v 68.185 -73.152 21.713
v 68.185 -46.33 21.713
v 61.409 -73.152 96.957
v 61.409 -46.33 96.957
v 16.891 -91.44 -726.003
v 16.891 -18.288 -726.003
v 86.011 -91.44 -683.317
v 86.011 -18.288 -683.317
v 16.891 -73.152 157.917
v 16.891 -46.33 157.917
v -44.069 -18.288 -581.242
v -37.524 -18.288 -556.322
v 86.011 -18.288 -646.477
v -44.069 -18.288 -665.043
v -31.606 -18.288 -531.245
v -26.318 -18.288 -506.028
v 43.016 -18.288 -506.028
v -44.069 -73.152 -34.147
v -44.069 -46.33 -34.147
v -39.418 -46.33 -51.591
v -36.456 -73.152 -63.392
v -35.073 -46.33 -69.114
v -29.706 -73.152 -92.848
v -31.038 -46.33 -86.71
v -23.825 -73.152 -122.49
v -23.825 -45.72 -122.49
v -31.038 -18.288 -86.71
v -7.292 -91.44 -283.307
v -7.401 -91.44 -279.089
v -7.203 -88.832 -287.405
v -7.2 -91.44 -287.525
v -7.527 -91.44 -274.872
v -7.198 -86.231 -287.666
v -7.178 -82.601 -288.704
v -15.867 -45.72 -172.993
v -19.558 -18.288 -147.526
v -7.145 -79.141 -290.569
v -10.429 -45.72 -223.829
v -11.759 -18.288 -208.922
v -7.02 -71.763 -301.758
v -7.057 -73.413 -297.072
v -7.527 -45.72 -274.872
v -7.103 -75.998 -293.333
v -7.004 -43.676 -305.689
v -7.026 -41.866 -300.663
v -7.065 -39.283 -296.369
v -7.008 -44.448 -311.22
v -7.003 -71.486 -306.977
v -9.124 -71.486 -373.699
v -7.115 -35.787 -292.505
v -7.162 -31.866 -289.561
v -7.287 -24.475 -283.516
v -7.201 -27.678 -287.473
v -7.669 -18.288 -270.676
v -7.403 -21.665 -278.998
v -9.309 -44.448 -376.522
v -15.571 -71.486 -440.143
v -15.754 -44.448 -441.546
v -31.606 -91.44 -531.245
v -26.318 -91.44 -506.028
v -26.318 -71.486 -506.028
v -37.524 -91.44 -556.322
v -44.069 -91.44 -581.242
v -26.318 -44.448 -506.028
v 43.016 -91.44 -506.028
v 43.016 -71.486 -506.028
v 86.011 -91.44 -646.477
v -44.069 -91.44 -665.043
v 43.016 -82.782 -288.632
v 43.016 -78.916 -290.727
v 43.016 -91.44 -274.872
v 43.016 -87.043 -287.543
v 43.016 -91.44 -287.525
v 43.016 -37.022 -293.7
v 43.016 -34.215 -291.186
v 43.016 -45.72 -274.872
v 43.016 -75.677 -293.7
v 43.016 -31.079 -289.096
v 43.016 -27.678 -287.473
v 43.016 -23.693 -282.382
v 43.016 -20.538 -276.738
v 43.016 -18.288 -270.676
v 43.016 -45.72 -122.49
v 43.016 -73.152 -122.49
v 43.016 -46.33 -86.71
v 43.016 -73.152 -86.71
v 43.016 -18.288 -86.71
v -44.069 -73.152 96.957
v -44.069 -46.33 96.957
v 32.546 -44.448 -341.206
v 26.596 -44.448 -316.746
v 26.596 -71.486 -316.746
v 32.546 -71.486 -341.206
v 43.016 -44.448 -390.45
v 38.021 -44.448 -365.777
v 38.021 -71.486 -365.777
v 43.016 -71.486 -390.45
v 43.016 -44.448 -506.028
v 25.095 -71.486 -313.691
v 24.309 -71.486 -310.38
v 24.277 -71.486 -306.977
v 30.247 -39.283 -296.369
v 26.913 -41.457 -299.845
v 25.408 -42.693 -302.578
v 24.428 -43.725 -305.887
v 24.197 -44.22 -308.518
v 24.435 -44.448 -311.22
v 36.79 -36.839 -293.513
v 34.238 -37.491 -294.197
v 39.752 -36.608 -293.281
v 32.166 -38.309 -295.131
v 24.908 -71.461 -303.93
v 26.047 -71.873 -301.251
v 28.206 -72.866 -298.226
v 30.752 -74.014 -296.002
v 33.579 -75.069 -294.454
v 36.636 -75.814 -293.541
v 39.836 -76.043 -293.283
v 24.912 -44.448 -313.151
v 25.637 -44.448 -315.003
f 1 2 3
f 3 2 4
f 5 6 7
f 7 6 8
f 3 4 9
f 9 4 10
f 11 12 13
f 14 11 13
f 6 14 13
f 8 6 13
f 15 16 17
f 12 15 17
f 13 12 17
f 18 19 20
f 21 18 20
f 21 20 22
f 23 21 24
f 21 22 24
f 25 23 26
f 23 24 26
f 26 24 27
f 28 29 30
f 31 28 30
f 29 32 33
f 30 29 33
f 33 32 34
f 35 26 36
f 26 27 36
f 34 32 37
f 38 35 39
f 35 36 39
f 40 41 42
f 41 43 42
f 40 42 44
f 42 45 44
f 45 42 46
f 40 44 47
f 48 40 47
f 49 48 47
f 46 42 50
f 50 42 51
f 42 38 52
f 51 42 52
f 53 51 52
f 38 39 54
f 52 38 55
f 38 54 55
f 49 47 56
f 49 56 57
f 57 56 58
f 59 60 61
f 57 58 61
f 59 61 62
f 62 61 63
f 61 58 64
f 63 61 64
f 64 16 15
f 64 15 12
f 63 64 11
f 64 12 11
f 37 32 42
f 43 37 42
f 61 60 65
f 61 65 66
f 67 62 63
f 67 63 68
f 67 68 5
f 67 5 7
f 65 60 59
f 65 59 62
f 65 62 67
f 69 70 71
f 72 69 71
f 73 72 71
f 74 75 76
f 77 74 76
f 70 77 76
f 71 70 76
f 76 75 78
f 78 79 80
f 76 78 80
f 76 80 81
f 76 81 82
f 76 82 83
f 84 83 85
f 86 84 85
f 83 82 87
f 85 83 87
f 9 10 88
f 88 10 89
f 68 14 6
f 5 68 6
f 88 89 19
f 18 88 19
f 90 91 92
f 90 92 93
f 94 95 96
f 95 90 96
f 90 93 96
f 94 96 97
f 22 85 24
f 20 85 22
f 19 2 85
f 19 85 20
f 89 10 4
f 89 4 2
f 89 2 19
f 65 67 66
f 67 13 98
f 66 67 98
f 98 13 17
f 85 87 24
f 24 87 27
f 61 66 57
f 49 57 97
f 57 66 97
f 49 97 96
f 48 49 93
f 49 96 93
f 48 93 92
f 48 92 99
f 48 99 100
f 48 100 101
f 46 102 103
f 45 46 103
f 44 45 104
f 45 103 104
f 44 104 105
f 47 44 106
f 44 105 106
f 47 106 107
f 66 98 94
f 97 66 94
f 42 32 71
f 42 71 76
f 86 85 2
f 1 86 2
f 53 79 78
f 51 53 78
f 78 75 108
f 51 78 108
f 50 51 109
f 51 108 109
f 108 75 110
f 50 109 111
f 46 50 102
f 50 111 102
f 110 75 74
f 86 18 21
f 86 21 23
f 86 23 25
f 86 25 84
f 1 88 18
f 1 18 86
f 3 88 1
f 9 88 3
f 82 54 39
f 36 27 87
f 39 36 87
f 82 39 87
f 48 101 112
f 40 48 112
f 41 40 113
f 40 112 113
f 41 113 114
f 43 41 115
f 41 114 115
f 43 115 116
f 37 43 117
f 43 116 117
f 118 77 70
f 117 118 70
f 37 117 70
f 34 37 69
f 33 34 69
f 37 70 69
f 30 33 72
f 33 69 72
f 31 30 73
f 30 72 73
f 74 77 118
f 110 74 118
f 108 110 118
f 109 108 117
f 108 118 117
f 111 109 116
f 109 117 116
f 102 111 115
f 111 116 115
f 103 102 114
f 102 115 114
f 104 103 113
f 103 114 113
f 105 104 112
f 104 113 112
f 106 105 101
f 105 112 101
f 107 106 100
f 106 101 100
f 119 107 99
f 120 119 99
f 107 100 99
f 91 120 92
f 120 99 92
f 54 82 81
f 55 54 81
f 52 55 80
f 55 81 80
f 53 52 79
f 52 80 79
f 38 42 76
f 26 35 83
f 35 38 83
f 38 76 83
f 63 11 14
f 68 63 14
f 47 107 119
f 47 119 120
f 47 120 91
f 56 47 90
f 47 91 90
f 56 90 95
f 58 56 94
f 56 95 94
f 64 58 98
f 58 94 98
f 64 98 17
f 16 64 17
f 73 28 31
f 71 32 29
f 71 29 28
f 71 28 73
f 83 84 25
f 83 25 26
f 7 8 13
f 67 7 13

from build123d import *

# Parameters (mm, degrees)
F1_DEPTH  = 30.48
F2_DEPTH  = 30.48
F3_DEPTH  = 30.48
F5_DEPTH  = 661.416
F6_W      = 45.72
F6_H      = 152.3821130395
F7_DEPTH  = 222.504
F9_DEPTH  = 46.3296
F10_DEPTH = 18.288
F13_DEPTH = 296.2656
F14_DEPTH = 86.2584
F15_DEPTH = 18.288


with BuildPart() as f1:
    # F0 (on Front) → F1 (new body)
    with BuildSketch(Plane.XZ):
        Polygon((16.8911121702, 157.9167651749), (-44.0688878298, 96.9567651749), (16.8911121702, 96.9567651749), align=None)
        Polygon((16.8911121702, 96.9567651749), (-44.0688878298, 96.9567651749), (-44.0688878298, -665.0432348251), (16.8911121702, -665.0432348251), (16.8911121702, -726.0032348251), (86.011223495, -683.3165884018), (86.011223495, -646.4774608612), (43.015755713, -506.0282349586), (43.015755713, -86.7099538445), (68.1852996349, 21.7126905918), (61.4088848233, 96.9567651749), (16.8911121702, 157.9167651749), align=None)
        Polygon((16.8911121702, -665.0432348251), (-44.0688878298, -665.0432348251), (16.8911121702, -726.0032348251), align=None)
    extrude(amount=F1_DEPTH)

    # F2 (add): a face of the model
    f2_faces = [f1.faces().sort_by_distance(p)[0] for p in [
        (6.2050010019, -30.48, -294.9143233184),
    ]]
    extrude(f2_faces, amount=F2_DEPTH)

    # F3 (add): a face of the model
    f3_faces = [f1.faces().sort_by_distance(p)[0] for p in [
        (6.2050010019, -60.96, -294.9143233184),
    ]]
    extrude(f3_faces, amount=F3_DEPTH)

    # F4 (on face) → F5 (cut)
    with BuildSketch(Plane(origin=(0, 0, 0), x_dir=(-1, 0, 0), z_dir=(0, 1, 0))):
        with BuildLine():
            Line((44.0688878298, -581.2422633171), (44.0688878298, -34.1473101496))
            ThreePointArc((44.0688878298, -34.1473101496), (7.0024431669, -307.6947867334), (44.0688878298, -581.2422633171))
        make_face()
    extrude(amount=-F5_DEPTH, mode=Mode.SUBTRACT)

    # F6 (on face) → F7 (cut)
    with BuildSketch(Plane.YZ.offset(43.015755713)):
        with Locations((-68.58, -198.6809484661)):
            Rectangle(F6_W, F6_H)
    extrude(amount=-F7_DEPTH, mode=Mode.SUBTRACT)

    # F8 (on face) → F9 (cut)
    with BuildSketch(Plane(origin=(0, 0, 0), x_dir=(-1, 0, 0), z_dir=(0, 1, 0))):
        with BuildLine():
            Line((-68.1852996349, 21.7126905918), (-43.015755713, -86.7099538445))
            Line((-43.015755713, -86.7099538445), (31.0375482418, -86.7099538445))
            ThreePointArc((31.0375482418, -86.7099538445), (37.2070107283, -60.3428002224), (44.0688878298, -34.1473101496))
            Line((44.0688878298, -34.1473101496), (44.0688878298, 96.9567651749))
            Line((44.0688878298, 96.9567651749), (-16.8911121702, 157.9167651749))
            Line((-16.8911121702, 157.9167651749), (-61.4088848233, 96.9567651749))
            Line((-61.4088848233, 96.9567651749), (-68.1852996349, 21.7126905918))
        make_face()
    extrude(amount=-F9_DEPTH, mode=Mode.SUBTRACT)

    # F10 (cut): a face of the model
    f10_faces = [f1.faces().sort_by_distance(p)[0] for p in [
        (15.3196752296, 0, -444.822898096),
    ]]
    extrude(f10_faces, amount=-F10_DEPTH, mode=Mode.SUBTRACT)

    # F12 (on face) → F13 (cut)
    with BuildSketch(Plane.XZ.offset(91.44)):
        with BuildLine():
            Line((43.015755713, -390.4501199722), (43.015755713, -293.7003970146))
            ThreePointArc((43.015755713, -293.7003970146), (27.028136051, -299.6814009845), (26.5955161303, -316.7456686497))
            ThreePointArc((26.5955161303, -316.7456686497), (35.3432447647, -353.478123173), (43.015755713, -390.4501199722))
        make_face()
    extrude(amount=-F13_DEPTH, mode=Mode.SUBTRACT)

    # F11 (on face) → F14 (cut)
    with BuildSketch(Plane.YZ.offset(43.015755713)):
        with BuildLine():
            Line((-71.4861452579, -398.3681499958), (-71.4861452579, -306.9769144058))
            ThreePointArc((-71.4861452579, -306.9769144058), (-76.814746868, -292.4826164705), (-91.44, -287.5247299671))
            Line((-91.44, -287.5247299671), (-91.44, -506.0282349586))
            Line((-91.44, -506.0282349586), (-71.4861452579, -506.0282349586))
            Line((-71.4861452579, -506.0282349586), (-71.4861452579, -398.3681499958))
        make_face()
        with BuildLine():
            ThreePointArc((-27.6783167816, -287.4728058939), (-23.0664051614, -286.1317966662), (-18.288, -285.6471538544))
            Line((-18.288, -285.6471538544), (-18.288, -270.6759691181))
            ThreePointArc((-18.288, -270.6759691181), (-22.0060984175, -279.6206155123), (-27.6783167816, -287.4728058939))
        make_face()
        with BuildLine():
            Line((-44.4478472258, -398.3681499958), (-44.4478472258, -506.0282349586))
            Line((-44.4478472258, -506.0282349586), (-18.288, -506.0282349586))
            Line((-18.288, -506.0282349586), (-18.288, -285.6471538544))
            ThreePointArc((-18.288, -285.6471538544), (-23.0664051614, -286.1317966662), (-27.6783167816, -287.4728058939))
            ThreePointArc((-27.6783167816, -287.4728058939), (-33.0895793591, -292.4309253132), (-39.2827639268, -296.3690944016))
            ThreePointArc((-39.2827639268, -296.3690944016), (-42.9947480165, -303.4018680478), (-44.4478472258, -311.2202587856))
            Line((-44.4478472258, -311.2202587856), (-44.4478472258, -312.9553496838))
            Line((-44.4478472258, -312.9553496838), (-44.4478472258, -398.3681499958))
        make_face()
        with BuildLine():
            ThreePointArc((-39.2827639268, -296.3690944016), (-33.0895793591, -292.4309253132), (-27.6783167816, -287.4728058939))
            ThreePointArc((-27.6783167816, -287.4728058939), (-34.1077092685, -291.1028619629), (-39.2827639268, -296.3690944016))
        make_face()
    extrude(amount=-F14_DEPTH, mode=Mode.SUBTRACT)

    # F15 (cut): a face of the model
    f15_faces = [f1.faces().sort_by_distance(p)[0] for p in [
        (9.0527657061, -91.44, 12.1173213598),
    ]]
    extrude(f15_faces, amount=-F15_DEPTH, mode=Mode.SUBTRACT)


solid = f1.part
